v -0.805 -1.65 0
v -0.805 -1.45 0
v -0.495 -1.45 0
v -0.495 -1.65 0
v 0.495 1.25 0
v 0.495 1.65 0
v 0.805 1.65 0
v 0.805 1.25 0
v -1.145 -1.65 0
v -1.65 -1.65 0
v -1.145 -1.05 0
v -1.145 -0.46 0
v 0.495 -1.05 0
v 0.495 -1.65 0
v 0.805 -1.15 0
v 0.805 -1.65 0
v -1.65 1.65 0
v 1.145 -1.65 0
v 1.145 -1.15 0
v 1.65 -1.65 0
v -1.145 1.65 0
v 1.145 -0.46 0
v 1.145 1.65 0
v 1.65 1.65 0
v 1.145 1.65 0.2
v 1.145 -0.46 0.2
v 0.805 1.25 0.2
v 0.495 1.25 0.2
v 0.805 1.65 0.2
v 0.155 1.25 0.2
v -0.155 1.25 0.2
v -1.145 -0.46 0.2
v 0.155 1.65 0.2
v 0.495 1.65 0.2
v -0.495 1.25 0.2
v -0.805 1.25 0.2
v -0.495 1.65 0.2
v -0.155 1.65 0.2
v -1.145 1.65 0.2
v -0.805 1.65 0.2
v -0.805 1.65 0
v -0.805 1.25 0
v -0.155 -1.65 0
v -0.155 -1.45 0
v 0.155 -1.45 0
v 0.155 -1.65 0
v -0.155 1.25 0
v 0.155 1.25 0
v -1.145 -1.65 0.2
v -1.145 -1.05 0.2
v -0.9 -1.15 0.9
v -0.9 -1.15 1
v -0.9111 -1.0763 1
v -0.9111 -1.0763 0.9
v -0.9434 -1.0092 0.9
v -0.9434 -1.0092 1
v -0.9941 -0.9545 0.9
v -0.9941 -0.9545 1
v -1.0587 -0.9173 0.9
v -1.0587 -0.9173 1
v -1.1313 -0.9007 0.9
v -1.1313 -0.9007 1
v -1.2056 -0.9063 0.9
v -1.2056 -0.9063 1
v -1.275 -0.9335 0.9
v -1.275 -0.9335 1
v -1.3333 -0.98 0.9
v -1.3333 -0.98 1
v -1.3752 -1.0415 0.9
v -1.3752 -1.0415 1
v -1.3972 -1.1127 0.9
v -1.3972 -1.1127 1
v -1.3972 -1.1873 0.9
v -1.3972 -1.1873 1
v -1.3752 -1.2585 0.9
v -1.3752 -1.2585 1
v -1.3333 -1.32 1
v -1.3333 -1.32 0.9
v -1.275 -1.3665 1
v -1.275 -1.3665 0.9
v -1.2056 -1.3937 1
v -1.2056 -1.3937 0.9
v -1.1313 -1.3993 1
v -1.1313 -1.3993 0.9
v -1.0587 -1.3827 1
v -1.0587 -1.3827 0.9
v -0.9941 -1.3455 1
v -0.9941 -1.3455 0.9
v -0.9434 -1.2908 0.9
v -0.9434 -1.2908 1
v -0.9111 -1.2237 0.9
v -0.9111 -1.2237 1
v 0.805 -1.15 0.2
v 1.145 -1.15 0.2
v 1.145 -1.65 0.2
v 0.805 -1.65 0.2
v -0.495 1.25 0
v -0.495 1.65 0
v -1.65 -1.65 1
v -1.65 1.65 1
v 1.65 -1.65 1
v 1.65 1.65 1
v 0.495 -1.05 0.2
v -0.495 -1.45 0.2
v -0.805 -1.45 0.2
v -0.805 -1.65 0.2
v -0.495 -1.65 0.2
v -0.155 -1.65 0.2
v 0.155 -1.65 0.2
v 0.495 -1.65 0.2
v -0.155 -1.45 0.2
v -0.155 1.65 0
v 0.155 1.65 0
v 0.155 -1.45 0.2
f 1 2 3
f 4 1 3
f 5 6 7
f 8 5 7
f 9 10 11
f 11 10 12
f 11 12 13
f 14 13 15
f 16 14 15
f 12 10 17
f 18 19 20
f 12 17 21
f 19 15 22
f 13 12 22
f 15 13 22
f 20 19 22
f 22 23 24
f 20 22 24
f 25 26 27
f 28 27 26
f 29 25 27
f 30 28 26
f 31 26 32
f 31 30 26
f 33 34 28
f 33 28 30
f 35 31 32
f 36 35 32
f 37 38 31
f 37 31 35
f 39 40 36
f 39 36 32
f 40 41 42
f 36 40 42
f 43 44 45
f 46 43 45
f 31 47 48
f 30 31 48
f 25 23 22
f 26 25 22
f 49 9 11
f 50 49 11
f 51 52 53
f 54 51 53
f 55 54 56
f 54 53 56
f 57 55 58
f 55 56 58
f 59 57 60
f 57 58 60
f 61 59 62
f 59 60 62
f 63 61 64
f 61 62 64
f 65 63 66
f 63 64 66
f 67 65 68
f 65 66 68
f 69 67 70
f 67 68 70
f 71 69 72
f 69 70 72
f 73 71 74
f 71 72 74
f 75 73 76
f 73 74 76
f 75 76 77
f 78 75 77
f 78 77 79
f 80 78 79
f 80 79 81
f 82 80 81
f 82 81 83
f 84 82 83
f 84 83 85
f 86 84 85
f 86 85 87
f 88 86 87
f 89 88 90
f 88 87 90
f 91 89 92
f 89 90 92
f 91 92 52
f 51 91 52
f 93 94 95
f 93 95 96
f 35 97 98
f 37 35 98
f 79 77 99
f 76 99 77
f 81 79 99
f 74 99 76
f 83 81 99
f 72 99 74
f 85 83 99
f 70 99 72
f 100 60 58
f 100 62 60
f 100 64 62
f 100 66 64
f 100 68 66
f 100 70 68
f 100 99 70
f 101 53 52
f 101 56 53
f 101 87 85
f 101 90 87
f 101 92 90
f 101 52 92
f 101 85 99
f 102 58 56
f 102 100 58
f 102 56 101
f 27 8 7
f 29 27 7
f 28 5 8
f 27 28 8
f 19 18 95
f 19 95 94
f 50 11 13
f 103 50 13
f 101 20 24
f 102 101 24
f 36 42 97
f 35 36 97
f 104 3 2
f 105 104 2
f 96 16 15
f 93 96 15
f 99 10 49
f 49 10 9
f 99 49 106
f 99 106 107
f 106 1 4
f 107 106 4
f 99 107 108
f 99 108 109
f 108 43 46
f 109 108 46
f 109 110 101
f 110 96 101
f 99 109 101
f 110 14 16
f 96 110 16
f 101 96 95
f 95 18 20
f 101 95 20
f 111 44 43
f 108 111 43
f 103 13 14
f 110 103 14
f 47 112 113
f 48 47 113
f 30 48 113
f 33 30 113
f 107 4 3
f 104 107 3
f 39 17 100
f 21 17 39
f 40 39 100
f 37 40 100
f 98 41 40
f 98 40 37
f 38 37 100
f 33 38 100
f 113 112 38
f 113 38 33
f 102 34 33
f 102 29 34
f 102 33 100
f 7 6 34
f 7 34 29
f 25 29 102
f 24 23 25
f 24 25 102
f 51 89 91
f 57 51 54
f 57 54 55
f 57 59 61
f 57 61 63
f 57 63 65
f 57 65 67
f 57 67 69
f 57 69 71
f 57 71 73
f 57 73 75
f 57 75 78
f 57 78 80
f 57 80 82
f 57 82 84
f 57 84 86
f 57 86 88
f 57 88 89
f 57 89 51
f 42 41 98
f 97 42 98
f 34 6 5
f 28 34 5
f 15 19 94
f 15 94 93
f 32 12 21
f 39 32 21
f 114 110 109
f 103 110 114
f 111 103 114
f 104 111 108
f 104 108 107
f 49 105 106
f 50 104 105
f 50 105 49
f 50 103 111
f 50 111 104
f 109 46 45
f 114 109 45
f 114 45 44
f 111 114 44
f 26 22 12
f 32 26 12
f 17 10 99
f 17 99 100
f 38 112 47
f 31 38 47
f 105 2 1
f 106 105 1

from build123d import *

# Parameters (mm, degrees)
SKETCH_1_W          = 3.3
SKETCH_1_H          = 3.3
EXTRUDE_1_DEPTH     = 1
SKETCH_2_R          = 0.25
CUT_EXTRUDE_1_DEPTH = 0.1
SKETCH_3_W          = 0.34
SKETCH_3_H          = 0.5
CUT_EXTRUDE_2_DEPTH = 0.2


with BuildPart() as part:
    # Эскиз1 → Бобышка-Вытянуть1 (new body)
    with BuildSketch(Plane.XY):
        Rectangle(SKETCH_1_W, SKETCH_1_H)
    extrude(amount=EXTRUDE_1_DEPTH)

    # Эскиз2 → Вырез-Вытянуть1 (cut)
    with BuildSketch(Plane.XY.offset(1)):
        with Locations((-1.15, -1.15)):
            Circle(SKETCH_2_R)
    extrude(amount=-CUT_EXTRUDE_1_DEPTH, mode=Mode.SUBTRACT)

    # Эскиз3 → Вырез-Вытянуть2 (cut)
    with BuildSketch(Plane(origin=(0, 0, 0), x_dir=(-1, 0, 0), z_dir=(0, 0, -1))):
        Polygon((-1.145, 1.65), (-1.145, -0.46), (1.145, -0.46), (1.145, 1.65), (0.805, 1.65), (0.805, 1.25), (0.495, 1.25), (0.495, 1.65), (0.155, 1.65), (0.155, 1.25), (-0.155, 1.25), (-0.155, 1.65), (-0.495, 1.65), (-0.495, 1.25), (-0.805, 1.25), (-0.805, 1.65), align=None)
        Polygon((1.145, -1.65), (1.145, -1.05), (-0.495, -1.05), (-0.495, -1.65), (-0.155, -1.65), (-0.155, -1.45), (0.155, -1.45), (0.155, -1.65), (0.495, -1.65), (0.495, -1.45), (0.805, -1.45), (0.805, -1.65), align=None)
        with Locations((-0.975, -1.4)):
            Rectangle(SKETCH_3_W, SKETCH_3_H)
    extrude(amount=-CUT_EXTRUDE_2_DEPTH, mode=Mode.SUBTRACT)


solid = part.part
